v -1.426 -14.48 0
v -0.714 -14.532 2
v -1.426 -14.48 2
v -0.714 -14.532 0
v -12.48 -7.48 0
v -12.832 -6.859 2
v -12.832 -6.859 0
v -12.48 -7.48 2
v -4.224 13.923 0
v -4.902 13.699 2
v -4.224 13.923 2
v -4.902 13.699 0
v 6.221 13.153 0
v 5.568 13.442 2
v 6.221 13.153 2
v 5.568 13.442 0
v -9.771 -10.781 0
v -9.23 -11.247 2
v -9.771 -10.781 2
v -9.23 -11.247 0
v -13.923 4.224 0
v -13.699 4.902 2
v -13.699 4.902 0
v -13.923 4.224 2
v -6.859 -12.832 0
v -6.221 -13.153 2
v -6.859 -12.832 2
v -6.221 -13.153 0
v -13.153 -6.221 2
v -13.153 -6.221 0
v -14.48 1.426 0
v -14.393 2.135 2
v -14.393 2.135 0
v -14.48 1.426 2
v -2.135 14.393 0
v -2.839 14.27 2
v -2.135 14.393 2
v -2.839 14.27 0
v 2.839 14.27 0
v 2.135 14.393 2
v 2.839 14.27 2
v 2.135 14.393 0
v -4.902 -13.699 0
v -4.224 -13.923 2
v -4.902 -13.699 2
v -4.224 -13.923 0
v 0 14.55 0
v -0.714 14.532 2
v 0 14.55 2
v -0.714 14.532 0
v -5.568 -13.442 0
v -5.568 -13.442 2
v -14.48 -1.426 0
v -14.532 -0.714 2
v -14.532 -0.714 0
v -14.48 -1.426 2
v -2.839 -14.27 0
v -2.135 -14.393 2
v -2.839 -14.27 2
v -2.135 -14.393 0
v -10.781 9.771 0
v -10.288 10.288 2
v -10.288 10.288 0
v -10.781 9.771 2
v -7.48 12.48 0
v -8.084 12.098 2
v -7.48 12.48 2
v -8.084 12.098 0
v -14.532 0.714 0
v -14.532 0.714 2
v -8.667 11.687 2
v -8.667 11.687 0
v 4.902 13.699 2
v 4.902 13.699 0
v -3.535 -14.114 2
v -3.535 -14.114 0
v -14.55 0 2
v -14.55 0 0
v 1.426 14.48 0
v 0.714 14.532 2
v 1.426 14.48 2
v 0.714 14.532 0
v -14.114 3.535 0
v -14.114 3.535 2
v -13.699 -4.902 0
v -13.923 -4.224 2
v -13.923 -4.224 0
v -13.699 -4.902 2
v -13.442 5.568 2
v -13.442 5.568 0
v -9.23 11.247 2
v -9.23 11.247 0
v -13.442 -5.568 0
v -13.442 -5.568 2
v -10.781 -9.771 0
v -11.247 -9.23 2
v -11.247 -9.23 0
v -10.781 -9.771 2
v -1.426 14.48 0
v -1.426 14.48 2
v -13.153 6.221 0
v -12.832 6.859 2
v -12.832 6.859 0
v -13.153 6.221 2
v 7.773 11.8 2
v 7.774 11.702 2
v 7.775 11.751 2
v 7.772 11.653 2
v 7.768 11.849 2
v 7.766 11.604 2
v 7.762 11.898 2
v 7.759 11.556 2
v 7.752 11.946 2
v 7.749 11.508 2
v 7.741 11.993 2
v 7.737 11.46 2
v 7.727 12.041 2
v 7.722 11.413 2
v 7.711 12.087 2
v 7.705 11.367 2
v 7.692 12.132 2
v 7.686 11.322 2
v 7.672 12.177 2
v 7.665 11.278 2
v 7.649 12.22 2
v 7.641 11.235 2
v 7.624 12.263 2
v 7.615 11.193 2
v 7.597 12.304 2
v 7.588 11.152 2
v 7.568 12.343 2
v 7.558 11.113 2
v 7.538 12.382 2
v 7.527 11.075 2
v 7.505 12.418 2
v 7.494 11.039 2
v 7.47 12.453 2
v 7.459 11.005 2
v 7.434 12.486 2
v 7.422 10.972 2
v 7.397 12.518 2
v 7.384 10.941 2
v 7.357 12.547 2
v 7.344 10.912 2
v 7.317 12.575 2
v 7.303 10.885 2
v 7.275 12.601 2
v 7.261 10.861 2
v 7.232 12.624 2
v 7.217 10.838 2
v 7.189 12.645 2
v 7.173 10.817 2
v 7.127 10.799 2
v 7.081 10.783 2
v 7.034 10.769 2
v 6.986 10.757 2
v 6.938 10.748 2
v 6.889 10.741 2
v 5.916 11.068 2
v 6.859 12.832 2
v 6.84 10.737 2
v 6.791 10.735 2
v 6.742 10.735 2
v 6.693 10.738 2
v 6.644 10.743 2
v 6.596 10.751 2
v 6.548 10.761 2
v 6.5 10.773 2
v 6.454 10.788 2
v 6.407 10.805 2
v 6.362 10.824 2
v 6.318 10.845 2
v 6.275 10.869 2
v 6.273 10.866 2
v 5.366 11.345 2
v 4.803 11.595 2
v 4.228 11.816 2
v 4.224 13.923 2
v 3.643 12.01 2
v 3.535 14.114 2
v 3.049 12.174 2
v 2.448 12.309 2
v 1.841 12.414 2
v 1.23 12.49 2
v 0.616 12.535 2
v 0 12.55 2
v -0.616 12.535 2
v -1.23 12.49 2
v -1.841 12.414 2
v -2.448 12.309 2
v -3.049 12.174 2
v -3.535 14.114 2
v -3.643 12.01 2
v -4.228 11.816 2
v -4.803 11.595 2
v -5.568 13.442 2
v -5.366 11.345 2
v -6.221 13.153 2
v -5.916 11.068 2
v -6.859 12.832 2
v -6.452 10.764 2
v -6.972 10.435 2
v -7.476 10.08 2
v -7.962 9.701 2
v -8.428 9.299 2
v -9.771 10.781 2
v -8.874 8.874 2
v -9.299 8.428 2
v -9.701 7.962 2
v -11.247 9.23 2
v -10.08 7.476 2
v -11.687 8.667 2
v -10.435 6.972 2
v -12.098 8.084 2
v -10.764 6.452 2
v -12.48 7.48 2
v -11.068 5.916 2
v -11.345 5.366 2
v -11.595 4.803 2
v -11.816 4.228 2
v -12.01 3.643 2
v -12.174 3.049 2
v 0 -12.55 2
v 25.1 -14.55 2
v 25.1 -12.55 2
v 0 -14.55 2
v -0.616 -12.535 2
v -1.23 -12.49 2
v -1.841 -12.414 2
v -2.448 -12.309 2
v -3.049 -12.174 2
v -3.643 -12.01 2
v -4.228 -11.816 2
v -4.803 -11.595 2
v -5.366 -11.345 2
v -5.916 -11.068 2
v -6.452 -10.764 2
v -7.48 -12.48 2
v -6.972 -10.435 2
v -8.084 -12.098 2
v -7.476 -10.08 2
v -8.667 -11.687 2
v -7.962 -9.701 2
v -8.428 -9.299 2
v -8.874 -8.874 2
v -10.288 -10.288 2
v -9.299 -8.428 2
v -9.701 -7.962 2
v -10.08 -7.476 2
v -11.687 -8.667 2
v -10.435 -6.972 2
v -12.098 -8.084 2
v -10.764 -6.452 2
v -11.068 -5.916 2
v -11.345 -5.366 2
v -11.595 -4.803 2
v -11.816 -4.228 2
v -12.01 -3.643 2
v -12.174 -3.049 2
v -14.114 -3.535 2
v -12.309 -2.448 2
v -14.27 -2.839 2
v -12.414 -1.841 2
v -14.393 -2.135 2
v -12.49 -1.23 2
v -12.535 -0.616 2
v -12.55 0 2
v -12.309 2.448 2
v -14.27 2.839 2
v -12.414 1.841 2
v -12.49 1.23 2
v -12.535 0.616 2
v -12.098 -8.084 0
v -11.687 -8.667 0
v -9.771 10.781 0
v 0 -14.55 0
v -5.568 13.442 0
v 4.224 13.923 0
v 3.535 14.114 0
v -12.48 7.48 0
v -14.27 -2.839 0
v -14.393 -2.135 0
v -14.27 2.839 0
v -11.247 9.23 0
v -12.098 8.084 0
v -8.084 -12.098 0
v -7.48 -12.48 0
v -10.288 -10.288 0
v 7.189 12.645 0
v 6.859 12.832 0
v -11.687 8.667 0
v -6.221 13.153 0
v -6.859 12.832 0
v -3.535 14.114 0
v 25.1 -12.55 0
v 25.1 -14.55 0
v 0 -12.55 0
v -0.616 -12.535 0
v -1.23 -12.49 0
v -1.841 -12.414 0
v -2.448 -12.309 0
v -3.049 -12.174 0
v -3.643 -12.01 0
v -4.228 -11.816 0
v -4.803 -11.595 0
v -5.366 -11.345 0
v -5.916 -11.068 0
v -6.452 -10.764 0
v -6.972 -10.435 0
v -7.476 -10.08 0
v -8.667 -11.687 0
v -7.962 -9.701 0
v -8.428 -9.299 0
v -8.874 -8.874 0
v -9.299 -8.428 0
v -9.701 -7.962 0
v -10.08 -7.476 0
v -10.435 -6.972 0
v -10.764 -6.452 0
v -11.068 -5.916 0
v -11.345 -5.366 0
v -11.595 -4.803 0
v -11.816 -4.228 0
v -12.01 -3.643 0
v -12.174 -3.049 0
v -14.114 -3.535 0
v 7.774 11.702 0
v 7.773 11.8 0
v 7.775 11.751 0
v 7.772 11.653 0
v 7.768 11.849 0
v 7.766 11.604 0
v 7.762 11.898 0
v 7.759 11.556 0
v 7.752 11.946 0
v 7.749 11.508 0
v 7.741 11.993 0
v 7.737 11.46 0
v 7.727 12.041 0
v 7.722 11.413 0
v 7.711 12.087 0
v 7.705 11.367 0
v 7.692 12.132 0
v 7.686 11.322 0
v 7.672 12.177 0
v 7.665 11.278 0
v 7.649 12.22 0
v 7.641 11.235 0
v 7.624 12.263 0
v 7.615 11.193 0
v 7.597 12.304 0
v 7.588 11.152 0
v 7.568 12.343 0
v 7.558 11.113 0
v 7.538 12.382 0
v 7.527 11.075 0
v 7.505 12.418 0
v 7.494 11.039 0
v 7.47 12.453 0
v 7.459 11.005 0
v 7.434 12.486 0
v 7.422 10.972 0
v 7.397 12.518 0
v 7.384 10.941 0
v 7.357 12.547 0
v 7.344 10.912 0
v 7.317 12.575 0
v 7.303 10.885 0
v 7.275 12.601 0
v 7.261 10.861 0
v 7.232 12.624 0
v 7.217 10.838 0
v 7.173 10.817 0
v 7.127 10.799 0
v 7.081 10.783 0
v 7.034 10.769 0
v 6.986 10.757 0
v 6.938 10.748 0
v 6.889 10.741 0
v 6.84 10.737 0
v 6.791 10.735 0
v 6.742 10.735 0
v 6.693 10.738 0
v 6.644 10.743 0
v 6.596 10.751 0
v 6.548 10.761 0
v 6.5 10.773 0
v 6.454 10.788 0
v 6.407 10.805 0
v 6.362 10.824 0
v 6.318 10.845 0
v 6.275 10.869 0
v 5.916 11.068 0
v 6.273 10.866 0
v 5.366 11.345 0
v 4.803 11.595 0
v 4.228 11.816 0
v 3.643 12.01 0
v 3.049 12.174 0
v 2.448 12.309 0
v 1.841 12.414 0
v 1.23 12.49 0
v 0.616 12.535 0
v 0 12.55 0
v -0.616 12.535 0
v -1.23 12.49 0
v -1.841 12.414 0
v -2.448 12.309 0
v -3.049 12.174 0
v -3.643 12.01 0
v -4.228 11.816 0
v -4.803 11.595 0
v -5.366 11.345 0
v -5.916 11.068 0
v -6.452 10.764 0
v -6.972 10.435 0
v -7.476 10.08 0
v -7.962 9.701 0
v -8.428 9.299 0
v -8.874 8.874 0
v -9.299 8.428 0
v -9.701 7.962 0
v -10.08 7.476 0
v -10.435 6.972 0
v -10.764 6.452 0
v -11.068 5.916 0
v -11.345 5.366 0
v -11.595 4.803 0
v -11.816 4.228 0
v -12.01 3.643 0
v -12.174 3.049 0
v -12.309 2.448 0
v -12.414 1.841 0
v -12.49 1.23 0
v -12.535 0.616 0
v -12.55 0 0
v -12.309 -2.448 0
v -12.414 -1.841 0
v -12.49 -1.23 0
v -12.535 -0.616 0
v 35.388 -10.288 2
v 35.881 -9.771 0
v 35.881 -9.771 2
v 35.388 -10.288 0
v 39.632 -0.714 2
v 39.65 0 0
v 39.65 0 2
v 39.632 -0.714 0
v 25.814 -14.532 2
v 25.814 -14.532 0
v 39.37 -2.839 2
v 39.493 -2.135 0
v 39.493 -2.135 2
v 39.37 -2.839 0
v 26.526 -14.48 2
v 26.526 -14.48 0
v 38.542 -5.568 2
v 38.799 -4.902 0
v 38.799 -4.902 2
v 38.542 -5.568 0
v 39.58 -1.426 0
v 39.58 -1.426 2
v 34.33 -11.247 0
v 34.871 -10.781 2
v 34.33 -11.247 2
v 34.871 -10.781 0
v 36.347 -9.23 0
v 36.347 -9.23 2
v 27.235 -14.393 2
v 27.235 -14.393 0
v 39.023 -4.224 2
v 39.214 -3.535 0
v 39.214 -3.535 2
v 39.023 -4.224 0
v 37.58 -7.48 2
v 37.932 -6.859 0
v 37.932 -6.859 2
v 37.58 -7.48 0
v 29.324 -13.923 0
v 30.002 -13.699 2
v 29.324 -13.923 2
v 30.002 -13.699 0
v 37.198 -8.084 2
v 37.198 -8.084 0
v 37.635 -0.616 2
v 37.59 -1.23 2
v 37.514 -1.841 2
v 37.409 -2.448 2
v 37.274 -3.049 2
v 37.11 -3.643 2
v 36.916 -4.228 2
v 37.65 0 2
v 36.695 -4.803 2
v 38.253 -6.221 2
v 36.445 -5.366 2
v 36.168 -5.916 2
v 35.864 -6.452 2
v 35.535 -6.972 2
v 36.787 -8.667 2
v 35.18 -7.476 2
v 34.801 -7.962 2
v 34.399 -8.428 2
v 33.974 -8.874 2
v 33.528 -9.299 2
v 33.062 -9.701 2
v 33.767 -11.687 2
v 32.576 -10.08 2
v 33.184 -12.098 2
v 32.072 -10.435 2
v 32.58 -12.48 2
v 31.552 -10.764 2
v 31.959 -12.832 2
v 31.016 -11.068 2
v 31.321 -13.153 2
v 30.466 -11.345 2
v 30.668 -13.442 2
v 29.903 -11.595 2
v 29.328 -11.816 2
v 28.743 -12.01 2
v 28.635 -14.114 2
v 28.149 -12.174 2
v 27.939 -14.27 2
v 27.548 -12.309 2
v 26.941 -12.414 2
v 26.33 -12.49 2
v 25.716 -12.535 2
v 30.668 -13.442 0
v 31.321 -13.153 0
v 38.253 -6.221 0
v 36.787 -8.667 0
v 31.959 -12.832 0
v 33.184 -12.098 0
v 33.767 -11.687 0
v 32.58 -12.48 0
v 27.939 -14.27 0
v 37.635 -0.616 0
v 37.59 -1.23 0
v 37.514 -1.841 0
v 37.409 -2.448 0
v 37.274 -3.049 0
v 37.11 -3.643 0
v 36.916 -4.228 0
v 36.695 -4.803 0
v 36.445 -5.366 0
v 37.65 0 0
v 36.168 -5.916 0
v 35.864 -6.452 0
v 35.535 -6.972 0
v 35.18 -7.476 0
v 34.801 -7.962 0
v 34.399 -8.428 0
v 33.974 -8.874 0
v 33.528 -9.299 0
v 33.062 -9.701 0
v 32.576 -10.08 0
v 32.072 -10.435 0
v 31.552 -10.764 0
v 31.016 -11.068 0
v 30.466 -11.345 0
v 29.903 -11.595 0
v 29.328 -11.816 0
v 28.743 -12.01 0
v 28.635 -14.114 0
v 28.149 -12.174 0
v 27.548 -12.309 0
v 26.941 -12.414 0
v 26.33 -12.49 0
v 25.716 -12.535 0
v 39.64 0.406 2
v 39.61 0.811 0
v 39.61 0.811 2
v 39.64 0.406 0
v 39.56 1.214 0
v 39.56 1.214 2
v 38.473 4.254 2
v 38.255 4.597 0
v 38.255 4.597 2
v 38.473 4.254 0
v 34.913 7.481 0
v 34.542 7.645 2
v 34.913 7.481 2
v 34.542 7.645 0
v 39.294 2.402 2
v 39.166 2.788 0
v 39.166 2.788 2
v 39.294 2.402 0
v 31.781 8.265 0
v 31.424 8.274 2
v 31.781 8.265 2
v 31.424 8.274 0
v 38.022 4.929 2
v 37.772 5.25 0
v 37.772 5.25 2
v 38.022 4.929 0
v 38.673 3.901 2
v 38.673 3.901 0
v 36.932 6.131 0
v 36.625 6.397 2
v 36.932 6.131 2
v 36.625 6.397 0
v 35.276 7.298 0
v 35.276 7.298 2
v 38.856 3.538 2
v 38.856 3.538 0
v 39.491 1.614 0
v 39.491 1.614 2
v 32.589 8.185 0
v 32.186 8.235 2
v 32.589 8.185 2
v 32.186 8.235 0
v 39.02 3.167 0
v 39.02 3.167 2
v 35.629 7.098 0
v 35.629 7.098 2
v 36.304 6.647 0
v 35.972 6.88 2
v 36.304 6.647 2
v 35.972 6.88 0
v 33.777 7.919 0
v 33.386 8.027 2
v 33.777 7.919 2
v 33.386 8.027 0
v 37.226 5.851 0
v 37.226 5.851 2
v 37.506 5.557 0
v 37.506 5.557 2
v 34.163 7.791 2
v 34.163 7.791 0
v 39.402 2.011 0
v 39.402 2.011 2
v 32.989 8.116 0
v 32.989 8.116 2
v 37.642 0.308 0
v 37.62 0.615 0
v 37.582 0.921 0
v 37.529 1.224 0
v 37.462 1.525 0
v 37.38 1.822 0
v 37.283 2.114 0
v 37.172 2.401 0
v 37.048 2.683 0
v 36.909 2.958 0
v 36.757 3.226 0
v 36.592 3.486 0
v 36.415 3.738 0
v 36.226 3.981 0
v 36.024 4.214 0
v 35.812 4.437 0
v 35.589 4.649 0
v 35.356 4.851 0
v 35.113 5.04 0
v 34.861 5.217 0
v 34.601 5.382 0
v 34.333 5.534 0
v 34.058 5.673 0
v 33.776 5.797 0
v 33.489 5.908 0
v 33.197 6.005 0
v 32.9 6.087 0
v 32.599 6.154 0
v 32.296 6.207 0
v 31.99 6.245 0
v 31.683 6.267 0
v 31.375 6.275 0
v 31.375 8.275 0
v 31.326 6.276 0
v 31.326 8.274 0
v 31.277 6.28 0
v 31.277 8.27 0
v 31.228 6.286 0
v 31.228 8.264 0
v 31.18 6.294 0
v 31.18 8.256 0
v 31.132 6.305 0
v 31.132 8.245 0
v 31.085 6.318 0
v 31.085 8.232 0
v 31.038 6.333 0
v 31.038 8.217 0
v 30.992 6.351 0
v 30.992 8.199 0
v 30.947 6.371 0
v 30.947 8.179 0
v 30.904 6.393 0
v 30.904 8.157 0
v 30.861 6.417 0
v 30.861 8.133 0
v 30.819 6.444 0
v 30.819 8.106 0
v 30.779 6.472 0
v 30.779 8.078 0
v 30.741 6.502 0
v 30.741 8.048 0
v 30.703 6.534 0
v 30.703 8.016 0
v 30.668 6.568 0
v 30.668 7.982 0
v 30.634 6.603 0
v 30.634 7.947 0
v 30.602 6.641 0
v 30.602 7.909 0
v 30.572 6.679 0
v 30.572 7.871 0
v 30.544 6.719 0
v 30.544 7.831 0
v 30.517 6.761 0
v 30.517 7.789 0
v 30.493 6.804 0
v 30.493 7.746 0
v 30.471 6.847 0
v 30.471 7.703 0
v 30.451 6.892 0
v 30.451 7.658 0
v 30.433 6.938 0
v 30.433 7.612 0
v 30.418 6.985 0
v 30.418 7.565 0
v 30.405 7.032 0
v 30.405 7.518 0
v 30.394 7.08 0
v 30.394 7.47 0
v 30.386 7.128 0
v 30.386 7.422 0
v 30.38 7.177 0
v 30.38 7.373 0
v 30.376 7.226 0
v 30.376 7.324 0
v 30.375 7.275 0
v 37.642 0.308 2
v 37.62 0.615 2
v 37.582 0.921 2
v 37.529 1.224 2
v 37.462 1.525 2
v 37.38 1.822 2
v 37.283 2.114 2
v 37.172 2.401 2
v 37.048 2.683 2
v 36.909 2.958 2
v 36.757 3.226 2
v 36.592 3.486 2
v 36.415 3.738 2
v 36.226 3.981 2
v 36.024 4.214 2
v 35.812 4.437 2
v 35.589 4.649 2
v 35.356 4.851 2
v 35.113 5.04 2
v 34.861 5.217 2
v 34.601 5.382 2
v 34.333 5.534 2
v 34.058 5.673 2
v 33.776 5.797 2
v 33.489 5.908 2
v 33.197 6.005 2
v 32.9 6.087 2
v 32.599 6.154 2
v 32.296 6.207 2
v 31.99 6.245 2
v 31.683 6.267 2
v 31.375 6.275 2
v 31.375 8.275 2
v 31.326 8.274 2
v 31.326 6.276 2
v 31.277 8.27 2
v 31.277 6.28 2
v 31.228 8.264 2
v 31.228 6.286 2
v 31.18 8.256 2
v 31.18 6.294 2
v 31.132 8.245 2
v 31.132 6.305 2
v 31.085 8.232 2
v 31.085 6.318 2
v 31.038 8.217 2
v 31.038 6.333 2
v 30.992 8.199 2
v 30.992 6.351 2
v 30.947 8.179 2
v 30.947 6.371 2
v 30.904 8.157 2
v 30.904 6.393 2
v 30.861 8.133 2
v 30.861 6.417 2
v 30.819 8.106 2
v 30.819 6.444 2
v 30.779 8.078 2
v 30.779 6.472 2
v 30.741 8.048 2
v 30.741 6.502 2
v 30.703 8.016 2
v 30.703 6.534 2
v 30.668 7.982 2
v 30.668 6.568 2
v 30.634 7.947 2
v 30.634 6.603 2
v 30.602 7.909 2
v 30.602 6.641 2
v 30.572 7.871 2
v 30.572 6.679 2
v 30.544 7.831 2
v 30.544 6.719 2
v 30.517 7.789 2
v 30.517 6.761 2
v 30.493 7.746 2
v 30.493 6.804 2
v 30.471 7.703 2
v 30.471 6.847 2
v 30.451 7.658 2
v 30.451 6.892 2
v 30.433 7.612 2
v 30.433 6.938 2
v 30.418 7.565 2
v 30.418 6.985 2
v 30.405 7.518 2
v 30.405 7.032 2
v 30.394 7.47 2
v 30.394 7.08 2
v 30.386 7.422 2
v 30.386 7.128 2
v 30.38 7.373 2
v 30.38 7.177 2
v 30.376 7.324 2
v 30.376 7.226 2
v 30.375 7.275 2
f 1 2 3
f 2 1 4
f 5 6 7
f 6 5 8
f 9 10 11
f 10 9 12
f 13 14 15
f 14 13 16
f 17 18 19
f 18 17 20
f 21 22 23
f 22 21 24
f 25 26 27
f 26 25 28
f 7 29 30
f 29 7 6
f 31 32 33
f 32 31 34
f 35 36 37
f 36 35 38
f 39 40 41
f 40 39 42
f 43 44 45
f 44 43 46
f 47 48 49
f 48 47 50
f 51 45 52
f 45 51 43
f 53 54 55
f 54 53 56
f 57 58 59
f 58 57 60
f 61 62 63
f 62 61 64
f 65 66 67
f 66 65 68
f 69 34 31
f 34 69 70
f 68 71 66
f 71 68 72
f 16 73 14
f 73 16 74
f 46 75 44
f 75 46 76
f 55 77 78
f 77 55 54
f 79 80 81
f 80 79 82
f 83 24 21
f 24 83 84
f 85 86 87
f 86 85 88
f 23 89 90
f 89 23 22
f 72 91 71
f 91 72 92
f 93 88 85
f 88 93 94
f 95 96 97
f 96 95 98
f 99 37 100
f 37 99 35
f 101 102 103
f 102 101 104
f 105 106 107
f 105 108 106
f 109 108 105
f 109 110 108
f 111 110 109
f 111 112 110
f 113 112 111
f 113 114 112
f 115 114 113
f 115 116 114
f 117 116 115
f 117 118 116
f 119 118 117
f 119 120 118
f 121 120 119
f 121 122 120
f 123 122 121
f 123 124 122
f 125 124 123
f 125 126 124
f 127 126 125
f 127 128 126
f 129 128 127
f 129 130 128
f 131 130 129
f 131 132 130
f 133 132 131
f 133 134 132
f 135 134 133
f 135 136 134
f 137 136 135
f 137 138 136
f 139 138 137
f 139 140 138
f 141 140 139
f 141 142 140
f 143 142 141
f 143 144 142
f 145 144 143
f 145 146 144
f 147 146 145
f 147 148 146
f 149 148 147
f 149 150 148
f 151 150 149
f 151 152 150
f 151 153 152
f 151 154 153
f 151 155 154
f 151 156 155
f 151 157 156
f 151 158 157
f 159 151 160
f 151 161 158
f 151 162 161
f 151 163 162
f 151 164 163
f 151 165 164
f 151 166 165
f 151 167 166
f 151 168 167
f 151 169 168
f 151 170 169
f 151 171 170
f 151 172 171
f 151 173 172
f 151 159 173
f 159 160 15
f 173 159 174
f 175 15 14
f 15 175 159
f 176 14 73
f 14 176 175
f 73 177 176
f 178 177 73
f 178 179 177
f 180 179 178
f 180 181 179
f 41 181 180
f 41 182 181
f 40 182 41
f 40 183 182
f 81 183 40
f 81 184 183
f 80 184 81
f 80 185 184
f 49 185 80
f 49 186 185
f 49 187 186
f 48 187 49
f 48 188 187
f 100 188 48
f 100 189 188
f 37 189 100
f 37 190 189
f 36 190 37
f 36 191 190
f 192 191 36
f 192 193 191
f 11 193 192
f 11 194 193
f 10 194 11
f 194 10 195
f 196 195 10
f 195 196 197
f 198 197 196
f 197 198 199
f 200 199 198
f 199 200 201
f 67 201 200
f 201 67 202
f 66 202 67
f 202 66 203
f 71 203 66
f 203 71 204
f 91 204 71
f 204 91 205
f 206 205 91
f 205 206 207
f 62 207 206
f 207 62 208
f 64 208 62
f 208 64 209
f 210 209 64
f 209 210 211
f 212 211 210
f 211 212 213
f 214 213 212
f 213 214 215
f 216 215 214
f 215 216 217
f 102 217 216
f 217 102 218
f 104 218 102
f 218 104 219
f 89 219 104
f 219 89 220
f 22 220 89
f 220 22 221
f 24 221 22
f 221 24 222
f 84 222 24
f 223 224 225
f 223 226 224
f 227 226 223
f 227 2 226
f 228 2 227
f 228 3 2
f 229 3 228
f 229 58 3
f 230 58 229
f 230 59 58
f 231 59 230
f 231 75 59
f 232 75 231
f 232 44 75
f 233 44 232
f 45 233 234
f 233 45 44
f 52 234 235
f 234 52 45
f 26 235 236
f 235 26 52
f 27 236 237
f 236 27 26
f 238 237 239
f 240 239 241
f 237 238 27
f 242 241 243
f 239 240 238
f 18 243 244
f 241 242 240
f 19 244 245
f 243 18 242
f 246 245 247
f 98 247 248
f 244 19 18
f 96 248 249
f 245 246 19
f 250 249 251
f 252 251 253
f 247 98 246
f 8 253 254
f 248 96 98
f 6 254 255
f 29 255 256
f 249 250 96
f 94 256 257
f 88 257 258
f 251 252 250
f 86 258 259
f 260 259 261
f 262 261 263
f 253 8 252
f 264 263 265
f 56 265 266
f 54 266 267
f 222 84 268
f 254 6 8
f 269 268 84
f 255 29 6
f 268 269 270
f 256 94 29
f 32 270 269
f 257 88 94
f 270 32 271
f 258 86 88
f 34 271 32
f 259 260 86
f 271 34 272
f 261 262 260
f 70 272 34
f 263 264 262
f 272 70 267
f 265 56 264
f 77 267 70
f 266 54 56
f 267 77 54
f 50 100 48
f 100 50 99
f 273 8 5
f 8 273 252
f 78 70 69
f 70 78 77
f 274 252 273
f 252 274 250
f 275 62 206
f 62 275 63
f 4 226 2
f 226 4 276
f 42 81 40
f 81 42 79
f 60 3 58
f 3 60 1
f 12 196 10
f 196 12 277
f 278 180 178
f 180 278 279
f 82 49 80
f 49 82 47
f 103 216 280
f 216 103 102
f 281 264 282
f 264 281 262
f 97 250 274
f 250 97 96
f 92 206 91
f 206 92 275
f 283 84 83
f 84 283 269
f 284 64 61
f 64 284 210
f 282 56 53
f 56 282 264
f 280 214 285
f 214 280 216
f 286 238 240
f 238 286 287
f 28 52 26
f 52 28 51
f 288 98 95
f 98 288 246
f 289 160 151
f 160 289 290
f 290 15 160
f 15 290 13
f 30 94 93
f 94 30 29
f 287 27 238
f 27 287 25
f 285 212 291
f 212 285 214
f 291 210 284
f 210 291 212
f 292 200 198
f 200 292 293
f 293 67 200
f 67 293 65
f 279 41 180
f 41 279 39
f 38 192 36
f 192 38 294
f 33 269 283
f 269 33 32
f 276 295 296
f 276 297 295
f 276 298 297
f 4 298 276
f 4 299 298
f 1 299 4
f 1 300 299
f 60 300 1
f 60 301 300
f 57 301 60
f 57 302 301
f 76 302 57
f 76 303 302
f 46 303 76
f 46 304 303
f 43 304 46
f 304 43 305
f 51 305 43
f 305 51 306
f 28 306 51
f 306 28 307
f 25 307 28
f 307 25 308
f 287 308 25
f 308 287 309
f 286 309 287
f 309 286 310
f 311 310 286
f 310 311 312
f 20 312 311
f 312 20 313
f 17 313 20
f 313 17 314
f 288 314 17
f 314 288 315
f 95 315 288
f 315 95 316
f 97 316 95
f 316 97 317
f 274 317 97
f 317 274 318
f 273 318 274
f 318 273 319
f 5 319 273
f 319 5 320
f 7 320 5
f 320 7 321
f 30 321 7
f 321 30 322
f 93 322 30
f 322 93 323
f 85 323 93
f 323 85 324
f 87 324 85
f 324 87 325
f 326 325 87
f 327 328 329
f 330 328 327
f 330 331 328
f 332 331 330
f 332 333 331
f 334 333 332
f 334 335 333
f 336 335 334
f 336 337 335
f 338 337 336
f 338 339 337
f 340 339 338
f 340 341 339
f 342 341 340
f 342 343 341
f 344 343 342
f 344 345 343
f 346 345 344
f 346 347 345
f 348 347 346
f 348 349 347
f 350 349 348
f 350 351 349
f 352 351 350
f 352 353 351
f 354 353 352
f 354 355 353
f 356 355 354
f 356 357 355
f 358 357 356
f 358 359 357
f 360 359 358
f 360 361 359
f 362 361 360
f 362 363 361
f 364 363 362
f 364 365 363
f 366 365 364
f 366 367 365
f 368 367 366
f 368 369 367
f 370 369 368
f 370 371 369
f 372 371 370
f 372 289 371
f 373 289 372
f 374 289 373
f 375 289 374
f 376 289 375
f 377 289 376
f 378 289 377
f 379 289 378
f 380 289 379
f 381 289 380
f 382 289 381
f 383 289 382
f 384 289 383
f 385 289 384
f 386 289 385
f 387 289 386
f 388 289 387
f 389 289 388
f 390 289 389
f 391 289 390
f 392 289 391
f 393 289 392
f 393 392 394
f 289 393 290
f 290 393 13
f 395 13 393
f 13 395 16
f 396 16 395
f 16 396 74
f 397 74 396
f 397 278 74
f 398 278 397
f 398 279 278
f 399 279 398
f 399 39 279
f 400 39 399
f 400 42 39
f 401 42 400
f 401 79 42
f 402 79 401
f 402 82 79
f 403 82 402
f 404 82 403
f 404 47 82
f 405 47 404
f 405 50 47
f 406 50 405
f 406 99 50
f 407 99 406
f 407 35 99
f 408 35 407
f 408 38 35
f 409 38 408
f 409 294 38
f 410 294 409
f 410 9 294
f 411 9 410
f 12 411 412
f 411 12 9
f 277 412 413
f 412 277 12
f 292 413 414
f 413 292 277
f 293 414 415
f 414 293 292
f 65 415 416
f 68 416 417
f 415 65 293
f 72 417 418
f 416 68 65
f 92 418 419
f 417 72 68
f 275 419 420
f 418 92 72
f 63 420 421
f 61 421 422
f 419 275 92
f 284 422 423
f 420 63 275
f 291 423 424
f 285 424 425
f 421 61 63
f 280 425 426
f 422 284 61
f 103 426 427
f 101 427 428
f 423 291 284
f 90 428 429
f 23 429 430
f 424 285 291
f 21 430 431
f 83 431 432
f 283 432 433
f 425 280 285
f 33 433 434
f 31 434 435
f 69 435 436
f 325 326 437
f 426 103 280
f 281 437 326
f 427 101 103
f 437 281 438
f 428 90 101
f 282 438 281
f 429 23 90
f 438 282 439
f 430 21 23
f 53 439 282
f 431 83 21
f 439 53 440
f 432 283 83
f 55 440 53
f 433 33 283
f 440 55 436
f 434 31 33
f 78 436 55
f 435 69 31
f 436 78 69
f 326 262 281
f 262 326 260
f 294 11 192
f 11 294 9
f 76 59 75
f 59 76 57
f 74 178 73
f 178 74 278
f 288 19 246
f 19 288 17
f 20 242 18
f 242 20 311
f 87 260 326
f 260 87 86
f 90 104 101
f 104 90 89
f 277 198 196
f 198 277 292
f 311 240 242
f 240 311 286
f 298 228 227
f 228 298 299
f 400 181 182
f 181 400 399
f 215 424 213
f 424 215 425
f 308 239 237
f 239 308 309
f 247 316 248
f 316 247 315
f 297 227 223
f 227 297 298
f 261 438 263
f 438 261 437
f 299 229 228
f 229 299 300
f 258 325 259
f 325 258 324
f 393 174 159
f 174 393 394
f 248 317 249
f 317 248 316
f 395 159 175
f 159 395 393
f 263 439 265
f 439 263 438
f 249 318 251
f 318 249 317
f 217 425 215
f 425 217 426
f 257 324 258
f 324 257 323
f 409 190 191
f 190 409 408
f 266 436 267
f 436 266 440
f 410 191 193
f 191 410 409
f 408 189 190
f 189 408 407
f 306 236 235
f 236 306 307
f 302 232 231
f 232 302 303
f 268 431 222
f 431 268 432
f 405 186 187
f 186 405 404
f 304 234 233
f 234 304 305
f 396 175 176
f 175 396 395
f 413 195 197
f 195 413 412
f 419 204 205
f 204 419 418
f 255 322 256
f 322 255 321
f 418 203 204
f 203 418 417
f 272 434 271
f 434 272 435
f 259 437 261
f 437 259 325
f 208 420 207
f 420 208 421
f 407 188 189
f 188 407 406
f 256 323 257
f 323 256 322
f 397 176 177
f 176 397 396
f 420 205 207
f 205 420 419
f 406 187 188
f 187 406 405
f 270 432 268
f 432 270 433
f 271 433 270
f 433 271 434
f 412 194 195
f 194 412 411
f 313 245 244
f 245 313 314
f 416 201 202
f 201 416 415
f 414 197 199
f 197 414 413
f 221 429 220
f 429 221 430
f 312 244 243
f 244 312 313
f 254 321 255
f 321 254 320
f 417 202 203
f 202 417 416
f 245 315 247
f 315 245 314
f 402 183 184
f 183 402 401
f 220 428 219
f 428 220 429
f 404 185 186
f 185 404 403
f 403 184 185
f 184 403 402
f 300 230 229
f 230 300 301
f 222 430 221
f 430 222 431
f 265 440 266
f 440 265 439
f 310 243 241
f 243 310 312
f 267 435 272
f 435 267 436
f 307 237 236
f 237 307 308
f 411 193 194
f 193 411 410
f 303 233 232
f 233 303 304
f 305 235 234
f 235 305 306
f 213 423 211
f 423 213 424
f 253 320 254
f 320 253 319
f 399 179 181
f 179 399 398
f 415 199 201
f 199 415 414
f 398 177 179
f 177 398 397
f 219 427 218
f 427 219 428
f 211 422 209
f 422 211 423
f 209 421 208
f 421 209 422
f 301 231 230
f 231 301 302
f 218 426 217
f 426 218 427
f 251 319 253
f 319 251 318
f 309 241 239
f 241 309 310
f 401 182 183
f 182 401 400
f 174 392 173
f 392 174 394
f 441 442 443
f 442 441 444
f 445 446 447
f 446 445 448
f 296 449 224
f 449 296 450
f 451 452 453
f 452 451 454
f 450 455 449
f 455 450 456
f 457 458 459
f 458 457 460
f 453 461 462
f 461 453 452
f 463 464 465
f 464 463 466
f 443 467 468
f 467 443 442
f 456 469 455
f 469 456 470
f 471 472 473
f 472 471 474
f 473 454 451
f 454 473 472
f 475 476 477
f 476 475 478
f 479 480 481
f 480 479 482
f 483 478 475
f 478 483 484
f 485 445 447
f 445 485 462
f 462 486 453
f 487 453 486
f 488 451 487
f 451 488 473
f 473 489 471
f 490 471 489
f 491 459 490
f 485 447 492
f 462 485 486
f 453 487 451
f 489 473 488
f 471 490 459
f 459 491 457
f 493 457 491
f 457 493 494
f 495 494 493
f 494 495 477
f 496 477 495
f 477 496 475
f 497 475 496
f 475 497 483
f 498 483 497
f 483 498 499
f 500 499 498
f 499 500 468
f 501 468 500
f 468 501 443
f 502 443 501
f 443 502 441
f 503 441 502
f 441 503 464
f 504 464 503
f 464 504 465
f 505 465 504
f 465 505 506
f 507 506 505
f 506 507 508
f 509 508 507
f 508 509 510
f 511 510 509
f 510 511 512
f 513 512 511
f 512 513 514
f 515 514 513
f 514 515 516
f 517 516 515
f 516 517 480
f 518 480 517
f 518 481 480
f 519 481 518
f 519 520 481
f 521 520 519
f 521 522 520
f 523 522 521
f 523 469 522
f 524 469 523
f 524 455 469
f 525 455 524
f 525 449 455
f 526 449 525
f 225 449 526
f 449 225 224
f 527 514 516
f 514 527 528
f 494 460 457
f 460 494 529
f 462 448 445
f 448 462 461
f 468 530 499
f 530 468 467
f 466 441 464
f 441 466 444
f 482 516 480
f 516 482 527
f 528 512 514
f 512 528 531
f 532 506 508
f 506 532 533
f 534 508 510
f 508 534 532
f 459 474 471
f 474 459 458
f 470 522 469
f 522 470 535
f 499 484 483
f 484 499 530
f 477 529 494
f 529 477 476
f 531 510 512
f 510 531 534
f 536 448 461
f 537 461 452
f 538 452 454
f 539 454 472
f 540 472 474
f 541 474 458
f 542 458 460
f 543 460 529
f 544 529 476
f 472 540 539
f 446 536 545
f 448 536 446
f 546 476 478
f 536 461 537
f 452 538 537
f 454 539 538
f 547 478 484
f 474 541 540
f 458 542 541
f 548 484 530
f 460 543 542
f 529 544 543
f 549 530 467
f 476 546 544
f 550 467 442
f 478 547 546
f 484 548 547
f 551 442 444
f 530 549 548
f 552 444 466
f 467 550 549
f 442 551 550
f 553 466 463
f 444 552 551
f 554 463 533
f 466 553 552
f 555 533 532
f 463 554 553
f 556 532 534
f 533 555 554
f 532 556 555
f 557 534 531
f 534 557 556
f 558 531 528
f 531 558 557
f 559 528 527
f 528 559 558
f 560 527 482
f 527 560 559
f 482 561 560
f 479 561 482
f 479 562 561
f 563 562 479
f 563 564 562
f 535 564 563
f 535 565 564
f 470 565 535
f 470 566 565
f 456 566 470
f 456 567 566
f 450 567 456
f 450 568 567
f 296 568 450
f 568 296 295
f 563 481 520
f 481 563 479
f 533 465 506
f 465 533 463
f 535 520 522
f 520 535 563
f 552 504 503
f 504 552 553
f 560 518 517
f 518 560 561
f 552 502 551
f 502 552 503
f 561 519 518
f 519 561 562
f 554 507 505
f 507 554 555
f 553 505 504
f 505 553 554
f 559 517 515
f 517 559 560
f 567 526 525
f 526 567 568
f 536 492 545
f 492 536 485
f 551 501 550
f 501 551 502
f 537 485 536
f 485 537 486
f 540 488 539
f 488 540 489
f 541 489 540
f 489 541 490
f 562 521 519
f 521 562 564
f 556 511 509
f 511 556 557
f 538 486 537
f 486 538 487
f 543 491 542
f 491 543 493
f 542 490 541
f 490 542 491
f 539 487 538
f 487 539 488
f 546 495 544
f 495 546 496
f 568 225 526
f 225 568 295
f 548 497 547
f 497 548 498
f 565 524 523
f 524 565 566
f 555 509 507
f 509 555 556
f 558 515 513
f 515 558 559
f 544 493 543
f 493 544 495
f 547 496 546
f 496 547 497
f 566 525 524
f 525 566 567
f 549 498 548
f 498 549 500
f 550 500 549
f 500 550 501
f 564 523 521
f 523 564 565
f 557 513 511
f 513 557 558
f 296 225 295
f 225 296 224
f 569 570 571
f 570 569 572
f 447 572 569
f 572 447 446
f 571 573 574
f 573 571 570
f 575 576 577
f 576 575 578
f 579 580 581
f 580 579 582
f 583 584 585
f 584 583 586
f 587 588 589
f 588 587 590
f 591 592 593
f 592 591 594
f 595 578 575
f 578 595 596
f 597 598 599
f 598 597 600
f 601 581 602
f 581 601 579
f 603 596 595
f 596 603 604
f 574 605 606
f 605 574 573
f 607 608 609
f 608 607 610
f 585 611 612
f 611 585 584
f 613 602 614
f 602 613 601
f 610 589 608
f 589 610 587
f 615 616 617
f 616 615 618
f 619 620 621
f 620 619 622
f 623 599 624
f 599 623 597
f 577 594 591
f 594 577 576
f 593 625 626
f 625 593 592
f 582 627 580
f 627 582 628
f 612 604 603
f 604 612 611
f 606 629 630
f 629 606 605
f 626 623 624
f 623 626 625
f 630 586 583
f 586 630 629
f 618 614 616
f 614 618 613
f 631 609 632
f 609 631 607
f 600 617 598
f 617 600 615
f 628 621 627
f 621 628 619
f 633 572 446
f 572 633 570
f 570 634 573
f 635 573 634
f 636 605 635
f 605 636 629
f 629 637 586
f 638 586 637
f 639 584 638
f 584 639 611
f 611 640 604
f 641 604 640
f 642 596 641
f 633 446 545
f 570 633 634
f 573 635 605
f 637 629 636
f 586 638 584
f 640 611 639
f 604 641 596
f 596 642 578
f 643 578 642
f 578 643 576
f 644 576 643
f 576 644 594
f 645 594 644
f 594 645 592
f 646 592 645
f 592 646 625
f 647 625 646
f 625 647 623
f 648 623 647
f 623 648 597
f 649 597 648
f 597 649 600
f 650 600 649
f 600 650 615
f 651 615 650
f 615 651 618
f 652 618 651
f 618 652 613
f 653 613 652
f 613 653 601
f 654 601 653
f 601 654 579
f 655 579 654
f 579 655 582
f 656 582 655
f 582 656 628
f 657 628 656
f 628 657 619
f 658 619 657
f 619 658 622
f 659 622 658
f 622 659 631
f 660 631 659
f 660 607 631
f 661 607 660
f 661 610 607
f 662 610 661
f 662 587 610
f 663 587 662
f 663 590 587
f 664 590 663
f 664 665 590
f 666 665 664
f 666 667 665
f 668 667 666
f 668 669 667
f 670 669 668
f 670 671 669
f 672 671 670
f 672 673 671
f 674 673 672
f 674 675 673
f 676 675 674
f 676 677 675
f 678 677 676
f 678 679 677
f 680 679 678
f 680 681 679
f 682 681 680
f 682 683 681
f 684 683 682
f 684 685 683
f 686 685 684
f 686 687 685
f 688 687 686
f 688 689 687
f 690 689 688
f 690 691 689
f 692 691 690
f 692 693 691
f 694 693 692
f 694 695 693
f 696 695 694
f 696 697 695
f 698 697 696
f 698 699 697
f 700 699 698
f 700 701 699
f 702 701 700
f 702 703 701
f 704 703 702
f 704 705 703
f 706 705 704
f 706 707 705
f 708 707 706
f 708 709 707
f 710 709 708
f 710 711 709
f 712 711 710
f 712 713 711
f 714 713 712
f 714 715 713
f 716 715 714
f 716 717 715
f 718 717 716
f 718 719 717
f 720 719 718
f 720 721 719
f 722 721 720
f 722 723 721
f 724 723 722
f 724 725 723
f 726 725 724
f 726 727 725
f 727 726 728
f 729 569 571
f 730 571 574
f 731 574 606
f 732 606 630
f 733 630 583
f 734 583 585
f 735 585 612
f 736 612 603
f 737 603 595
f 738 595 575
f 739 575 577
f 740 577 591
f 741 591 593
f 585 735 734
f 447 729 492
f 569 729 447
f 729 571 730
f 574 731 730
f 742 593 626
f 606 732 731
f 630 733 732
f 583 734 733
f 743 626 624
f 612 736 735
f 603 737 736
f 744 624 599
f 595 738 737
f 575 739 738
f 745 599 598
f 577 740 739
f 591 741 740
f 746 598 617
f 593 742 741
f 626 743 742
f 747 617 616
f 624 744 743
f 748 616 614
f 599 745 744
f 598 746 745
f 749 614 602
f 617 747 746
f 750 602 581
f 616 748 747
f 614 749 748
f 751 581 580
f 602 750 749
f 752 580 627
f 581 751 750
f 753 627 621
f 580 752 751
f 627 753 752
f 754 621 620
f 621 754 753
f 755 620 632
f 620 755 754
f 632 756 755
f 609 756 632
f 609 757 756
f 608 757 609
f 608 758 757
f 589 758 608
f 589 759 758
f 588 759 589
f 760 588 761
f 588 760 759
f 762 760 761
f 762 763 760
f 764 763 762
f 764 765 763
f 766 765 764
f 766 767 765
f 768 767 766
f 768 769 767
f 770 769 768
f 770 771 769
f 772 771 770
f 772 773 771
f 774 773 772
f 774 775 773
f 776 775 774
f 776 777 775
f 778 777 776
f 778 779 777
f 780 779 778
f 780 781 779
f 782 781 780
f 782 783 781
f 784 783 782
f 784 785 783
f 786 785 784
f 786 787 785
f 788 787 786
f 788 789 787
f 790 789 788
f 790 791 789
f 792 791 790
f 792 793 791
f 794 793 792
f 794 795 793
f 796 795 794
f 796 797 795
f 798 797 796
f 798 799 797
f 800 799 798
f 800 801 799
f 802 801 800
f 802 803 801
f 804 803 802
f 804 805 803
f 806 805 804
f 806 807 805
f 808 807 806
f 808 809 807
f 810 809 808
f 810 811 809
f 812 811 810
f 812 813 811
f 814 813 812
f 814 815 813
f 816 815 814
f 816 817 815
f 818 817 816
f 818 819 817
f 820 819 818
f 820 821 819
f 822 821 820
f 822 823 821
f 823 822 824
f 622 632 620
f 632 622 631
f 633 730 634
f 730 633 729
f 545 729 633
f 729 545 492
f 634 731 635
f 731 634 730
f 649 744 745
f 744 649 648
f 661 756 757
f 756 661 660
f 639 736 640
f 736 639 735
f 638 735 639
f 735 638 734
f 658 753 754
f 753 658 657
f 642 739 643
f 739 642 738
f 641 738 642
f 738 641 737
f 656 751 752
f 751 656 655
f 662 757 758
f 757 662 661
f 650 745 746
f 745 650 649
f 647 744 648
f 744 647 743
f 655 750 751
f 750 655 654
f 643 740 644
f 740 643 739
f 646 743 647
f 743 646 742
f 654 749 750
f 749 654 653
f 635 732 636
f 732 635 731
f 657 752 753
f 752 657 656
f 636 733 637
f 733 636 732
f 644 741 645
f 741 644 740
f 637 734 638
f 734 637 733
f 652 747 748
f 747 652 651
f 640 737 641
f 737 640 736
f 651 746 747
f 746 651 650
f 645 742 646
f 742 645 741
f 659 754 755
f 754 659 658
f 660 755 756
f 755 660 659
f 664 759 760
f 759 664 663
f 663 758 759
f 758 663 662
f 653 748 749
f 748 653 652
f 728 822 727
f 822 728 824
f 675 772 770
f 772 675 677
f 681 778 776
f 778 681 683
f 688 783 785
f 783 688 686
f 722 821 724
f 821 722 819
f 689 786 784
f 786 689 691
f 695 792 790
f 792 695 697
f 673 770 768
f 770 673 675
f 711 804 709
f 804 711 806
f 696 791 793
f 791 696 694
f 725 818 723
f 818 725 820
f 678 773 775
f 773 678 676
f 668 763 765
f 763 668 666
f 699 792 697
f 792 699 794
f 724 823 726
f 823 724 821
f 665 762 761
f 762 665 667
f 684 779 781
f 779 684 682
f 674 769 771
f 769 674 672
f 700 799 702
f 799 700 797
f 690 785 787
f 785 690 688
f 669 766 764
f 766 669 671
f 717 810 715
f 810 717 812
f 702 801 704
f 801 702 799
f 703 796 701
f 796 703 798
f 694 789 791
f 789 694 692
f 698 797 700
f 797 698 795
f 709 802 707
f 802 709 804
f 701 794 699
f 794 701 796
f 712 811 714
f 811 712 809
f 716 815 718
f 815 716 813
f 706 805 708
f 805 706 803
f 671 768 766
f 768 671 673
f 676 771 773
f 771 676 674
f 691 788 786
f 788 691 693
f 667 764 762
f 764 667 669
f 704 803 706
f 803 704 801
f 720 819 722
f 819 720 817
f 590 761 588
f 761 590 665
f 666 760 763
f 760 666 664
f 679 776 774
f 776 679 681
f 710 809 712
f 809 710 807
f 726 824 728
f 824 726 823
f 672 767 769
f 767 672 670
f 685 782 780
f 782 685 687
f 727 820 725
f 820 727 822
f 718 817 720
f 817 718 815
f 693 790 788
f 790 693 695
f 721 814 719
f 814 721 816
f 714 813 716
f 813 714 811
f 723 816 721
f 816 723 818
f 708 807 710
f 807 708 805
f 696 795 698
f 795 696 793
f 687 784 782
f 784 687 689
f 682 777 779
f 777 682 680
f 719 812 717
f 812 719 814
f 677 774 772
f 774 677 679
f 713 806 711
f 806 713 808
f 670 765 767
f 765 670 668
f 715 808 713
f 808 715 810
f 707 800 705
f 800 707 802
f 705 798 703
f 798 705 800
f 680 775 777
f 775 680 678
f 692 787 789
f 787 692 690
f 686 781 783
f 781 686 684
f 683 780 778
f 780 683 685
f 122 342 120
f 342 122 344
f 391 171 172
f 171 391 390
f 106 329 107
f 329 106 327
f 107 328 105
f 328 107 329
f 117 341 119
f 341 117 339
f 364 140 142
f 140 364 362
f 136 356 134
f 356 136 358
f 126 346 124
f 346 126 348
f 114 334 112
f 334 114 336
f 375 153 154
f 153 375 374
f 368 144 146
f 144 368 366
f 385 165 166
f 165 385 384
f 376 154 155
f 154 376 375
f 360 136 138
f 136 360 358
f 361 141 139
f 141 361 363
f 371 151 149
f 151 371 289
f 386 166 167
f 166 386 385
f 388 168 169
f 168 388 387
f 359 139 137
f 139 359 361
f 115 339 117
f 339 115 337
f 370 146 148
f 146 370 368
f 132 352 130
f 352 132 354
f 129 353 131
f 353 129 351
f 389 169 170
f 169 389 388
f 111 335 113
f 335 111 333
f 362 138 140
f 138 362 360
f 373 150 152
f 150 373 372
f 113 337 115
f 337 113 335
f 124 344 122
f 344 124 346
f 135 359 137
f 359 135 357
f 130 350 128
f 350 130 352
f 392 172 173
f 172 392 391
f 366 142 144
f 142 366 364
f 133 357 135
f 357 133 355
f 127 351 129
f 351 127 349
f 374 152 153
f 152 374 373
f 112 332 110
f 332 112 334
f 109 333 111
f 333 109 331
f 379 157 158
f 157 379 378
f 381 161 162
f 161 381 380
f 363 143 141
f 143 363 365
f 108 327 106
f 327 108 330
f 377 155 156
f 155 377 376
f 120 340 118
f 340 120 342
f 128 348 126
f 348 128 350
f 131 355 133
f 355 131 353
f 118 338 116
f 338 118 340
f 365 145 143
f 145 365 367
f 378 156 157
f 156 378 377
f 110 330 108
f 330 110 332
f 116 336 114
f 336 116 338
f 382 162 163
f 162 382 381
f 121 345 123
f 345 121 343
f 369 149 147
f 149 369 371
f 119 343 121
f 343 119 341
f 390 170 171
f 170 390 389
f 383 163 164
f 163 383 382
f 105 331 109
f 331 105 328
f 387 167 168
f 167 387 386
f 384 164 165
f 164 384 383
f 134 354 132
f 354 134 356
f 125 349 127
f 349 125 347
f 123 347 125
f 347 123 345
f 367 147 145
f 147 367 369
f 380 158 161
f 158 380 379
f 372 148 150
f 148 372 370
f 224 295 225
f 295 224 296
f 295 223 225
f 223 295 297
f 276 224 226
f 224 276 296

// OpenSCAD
$fn = 128;

faucet_d = 25.1;
faucet_r = faucet_d / 2;
clip_th = 2;
clip_r = faucet_r + clip_th;
clip_d = clip_r * 2;
clip_theta = -30;
scrubby_r = faucet_r/2;

module ring(r, th) {
  difference() {
    cylinder(r=r + th, h=th);
    translate([0, 0, -1]) {
      cylinder(r=r, h=th+2);
    }
  }
}

module quadrant(q, r, th) {
  dx = (q == 1 || q == 4) ? 0 : -r;
  dy = (q == 1 || q == 2) ? 0 : -r;
  translate([dx, dy, -1]) cube([r, r, th+2]);
}

difference() {
  ring(faucet_r, clip_th);
  quadrant(4, clip_r, clip_th);
  rotate([0, 0, clip_theta]) {
    translate([0, 0, -1]) {
      difference() {
        cylinder(r=clip_r+1, h=clip_th+2);
        quadrant(2, clip_r, clip_th);
        quadrant(3, clip_r, clip_th);
        quadrant(4, clip_r, clip_th);
      }
    }
  }
}
rotate([0, 0, clip_theta]) {
  translate([0, clip_r - clip_th/2, 0])
    cylinder(d=clip_th, h=clip_th);
}

translate([0, -clip_r, 0]) cube([faucet_d, clip_th, clip_th]);

translate([faucet_d, 0, 0]) {
  difference() {
    ring(faucet_r, clip_th);
    quadrant(1, clip_r, clip_th);
    quadrant(2, clip_r, clip_th);
    quadrant(3, clip_r, clip_th);
  }
  translate([faucet_r - scrubby_r, 0, 0]) {
    difference() {
      ring(scrubby_r, clip_th);
      quadrant(2, scrubby_r + clip_th, clip_th);
      quadrant(3, scrubby_r + clip_th, clip_th);
      quadrant(4, scrubby_r + clip_th, clip_th);
    }
    translate([0, scrubby_r + clip_th/2, 0]) cylinder(d=clip_th, h=clip_th);
  }
}
